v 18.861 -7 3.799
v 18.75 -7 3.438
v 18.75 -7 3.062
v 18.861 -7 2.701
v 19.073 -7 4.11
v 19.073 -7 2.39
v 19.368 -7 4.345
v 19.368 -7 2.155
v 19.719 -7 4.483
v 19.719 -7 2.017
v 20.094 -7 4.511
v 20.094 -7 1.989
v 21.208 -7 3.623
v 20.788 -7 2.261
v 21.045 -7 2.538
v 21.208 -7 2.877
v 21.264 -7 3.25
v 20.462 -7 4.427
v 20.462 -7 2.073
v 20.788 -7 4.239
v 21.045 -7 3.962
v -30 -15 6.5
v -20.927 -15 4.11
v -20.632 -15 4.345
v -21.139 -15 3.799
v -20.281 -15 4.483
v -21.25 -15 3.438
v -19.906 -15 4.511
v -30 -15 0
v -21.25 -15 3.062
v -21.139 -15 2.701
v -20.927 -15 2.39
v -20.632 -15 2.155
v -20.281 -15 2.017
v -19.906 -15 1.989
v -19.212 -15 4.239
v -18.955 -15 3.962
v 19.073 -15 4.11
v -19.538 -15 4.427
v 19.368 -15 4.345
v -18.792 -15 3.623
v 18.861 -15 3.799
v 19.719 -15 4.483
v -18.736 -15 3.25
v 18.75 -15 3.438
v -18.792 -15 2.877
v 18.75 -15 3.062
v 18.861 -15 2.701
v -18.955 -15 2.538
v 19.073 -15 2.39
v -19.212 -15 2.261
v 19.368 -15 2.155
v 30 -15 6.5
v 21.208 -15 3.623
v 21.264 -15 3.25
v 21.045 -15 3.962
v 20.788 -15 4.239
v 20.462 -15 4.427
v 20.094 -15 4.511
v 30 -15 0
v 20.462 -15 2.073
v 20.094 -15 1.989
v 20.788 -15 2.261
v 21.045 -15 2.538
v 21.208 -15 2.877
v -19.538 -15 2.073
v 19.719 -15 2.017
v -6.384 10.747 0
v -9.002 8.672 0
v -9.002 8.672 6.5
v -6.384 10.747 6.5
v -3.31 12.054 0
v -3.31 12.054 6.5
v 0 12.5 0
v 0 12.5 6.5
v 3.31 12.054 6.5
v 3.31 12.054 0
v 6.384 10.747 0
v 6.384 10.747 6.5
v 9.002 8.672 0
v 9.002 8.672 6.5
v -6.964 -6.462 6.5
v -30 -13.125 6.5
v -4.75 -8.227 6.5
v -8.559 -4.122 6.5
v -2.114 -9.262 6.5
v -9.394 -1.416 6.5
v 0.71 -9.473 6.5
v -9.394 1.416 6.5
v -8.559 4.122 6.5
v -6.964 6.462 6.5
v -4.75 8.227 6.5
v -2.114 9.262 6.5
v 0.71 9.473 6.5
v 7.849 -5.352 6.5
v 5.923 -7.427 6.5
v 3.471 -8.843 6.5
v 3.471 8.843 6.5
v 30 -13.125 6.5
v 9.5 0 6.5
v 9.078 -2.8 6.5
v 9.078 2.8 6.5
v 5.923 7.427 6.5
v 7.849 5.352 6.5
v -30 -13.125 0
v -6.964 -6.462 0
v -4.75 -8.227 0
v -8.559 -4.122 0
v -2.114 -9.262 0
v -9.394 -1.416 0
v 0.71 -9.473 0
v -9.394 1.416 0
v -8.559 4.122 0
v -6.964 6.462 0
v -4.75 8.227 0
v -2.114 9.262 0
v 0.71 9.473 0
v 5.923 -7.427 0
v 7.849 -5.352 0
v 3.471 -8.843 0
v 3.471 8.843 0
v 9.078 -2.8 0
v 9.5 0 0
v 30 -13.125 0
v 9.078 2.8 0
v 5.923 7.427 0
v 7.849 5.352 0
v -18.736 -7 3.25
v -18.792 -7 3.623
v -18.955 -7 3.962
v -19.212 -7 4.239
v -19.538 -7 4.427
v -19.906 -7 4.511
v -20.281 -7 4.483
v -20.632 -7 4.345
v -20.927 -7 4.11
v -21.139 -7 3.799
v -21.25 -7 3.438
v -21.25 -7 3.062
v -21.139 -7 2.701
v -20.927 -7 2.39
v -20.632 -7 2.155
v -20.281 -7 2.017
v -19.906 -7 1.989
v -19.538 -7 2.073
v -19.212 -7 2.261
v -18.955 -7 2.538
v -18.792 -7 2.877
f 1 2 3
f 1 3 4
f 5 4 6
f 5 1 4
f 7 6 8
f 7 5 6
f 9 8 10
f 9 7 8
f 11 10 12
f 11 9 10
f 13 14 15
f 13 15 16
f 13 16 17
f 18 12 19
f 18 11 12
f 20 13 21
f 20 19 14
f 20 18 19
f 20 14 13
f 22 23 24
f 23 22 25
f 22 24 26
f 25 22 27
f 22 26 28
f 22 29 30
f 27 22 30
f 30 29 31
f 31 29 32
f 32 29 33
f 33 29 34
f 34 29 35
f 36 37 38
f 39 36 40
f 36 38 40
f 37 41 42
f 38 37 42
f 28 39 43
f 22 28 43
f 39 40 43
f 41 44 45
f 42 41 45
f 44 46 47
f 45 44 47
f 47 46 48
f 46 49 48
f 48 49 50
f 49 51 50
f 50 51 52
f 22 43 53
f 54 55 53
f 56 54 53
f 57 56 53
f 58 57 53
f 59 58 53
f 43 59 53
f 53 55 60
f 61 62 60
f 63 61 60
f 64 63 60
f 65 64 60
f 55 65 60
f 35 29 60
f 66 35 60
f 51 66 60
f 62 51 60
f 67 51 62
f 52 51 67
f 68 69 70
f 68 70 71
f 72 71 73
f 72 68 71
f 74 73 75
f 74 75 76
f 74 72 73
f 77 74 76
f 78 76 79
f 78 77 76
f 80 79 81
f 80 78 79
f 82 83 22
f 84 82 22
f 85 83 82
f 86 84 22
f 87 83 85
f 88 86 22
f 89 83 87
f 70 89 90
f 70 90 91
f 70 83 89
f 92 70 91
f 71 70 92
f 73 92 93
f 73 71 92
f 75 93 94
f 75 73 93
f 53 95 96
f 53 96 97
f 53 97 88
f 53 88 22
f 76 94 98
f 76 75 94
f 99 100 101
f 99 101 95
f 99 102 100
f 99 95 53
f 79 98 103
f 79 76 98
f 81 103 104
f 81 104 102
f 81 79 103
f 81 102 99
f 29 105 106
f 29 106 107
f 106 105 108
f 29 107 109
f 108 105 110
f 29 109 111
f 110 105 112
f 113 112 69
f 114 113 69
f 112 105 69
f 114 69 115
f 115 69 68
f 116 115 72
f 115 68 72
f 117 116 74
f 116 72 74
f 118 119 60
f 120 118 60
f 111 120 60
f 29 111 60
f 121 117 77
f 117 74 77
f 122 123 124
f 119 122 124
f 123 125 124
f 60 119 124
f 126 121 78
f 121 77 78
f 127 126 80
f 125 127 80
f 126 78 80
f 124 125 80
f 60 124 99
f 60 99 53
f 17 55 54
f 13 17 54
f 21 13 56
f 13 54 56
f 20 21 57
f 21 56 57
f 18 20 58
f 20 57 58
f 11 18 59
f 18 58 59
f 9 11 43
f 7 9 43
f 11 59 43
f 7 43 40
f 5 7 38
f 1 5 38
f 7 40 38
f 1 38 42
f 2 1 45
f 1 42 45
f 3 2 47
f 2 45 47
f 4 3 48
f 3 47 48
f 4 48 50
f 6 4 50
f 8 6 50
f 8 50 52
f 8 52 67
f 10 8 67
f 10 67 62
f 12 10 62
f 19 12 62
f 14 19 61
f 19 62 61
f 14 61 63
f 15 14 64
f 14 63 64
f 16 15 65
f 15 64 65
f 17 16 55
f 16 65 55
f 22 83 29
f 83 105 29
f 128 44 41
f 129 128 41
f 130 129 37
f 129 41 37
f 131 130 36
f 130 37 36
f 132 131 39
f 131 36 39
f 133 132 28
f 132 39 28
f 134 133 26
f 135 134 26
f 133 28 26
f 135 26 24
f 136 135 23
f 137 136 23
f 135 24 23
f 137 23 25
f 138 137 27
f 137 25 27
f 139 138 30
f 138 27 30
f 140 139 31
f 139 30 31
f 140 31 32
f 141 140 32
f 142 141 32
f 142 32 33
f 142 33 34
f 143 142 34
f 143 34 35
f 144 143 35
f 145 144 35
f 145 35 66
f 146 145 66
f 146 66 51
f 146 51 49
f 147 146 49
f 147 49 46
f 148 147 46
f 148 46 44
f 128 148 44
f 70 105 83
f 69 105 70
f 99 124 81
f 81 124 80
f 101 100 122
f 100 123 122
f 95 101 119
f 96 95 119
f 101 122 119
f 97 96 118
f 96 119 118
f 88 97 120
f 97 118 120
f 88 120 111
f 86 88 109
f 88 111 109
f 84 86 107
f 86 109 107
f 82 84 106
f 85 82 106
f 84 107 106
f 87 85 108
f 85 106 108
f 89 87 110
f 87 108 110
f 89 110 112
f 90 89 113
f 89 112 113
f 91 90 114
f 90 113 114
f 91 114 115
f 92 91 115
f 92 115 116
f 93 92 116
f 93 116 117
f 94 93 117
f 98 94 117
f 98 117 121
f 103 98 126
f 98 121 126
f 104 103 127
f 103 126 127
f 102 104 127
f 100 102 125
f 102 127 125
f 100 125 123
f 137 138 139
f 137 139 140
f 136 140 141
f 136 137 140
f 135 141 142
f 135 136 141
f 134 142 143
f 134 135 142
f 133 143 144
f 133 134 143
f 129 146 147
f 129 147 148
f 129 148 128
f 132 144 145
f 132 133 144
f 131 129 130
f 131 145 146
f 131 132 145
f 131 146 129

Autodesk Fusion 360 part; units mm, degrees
sketch "Esboço1" plane through (0, 0, 0) normal (0, 0, 1) x (1, 0, 0)
  circle A0 centre (0, 0) radius 9.5
  circle A1 centre (0, 0) radius 12.5
  line L0 (-30, 22.0941) -> (-30, -26.9412) construction
  line L1 (-41.3447, -13.125) -> (30, -13.125) construction
  line L2 (-30, -13.125) -> (-9.0024, 8.6722)
  line L3 (-30, -13.125) -> (-30, -15)
  line L4 (-30, -15) -> (0, -15)
  line L5 (0, 0) -> (0, -30) construction
  line L6 (30, -13.125) -> (9.0024, 8.6722)
  line L7 (30, -13.125) -> (30, -15)
  line L8 (30, -15) -> (0, -15)
  dimension "d1" = 25
  dimension "d2" = 19
  dimension "d3" = 30
  dimension "d4" = 13.125
  dimension "d6" = 1.875
extrude "Extrusão1" add sketch "Esboço1" along normal blind 6.5
sketch "Esboço2" plane through (0, -15, 0) normal (0, -1, 0) x (1, 0, 0)
  line L0 (-30, 0) -> (30, 0)
  line L1 (30, 0) -> (30, 6.5)
  line L2 (30, 6.5) -> (-30, 6.5)
  line L3 (-30, 6.5) -> (-30, 0)
  line L4 (0, 0) -> (0, 15) construction
  line L5 (-20, 3.25) -> (20, 3.25) construction
  circle A0 centre (-20, 3.25) radius 1.5
  circle A1 centre (20, 3.25) radius 1.5
  dimension "d9" = 20
  dimension "d10" = 20
  dimension "d11" = 3.25
  dimension "d12" = 3
extrude "Extrusão2" cut sketch "Esboço2" against normal blind 8 contours A0 | A1
thread "Rosca1" "ISO Metric profile 3.0 M3x0.5 6H" major diameter 3.086 minor diameter 2.529 pitch 0.5 angle 60 resizes the face on face at (21.4925, -9.6667, 3.1006) on face at (-18.5075, -9.6667, 3.1006)
